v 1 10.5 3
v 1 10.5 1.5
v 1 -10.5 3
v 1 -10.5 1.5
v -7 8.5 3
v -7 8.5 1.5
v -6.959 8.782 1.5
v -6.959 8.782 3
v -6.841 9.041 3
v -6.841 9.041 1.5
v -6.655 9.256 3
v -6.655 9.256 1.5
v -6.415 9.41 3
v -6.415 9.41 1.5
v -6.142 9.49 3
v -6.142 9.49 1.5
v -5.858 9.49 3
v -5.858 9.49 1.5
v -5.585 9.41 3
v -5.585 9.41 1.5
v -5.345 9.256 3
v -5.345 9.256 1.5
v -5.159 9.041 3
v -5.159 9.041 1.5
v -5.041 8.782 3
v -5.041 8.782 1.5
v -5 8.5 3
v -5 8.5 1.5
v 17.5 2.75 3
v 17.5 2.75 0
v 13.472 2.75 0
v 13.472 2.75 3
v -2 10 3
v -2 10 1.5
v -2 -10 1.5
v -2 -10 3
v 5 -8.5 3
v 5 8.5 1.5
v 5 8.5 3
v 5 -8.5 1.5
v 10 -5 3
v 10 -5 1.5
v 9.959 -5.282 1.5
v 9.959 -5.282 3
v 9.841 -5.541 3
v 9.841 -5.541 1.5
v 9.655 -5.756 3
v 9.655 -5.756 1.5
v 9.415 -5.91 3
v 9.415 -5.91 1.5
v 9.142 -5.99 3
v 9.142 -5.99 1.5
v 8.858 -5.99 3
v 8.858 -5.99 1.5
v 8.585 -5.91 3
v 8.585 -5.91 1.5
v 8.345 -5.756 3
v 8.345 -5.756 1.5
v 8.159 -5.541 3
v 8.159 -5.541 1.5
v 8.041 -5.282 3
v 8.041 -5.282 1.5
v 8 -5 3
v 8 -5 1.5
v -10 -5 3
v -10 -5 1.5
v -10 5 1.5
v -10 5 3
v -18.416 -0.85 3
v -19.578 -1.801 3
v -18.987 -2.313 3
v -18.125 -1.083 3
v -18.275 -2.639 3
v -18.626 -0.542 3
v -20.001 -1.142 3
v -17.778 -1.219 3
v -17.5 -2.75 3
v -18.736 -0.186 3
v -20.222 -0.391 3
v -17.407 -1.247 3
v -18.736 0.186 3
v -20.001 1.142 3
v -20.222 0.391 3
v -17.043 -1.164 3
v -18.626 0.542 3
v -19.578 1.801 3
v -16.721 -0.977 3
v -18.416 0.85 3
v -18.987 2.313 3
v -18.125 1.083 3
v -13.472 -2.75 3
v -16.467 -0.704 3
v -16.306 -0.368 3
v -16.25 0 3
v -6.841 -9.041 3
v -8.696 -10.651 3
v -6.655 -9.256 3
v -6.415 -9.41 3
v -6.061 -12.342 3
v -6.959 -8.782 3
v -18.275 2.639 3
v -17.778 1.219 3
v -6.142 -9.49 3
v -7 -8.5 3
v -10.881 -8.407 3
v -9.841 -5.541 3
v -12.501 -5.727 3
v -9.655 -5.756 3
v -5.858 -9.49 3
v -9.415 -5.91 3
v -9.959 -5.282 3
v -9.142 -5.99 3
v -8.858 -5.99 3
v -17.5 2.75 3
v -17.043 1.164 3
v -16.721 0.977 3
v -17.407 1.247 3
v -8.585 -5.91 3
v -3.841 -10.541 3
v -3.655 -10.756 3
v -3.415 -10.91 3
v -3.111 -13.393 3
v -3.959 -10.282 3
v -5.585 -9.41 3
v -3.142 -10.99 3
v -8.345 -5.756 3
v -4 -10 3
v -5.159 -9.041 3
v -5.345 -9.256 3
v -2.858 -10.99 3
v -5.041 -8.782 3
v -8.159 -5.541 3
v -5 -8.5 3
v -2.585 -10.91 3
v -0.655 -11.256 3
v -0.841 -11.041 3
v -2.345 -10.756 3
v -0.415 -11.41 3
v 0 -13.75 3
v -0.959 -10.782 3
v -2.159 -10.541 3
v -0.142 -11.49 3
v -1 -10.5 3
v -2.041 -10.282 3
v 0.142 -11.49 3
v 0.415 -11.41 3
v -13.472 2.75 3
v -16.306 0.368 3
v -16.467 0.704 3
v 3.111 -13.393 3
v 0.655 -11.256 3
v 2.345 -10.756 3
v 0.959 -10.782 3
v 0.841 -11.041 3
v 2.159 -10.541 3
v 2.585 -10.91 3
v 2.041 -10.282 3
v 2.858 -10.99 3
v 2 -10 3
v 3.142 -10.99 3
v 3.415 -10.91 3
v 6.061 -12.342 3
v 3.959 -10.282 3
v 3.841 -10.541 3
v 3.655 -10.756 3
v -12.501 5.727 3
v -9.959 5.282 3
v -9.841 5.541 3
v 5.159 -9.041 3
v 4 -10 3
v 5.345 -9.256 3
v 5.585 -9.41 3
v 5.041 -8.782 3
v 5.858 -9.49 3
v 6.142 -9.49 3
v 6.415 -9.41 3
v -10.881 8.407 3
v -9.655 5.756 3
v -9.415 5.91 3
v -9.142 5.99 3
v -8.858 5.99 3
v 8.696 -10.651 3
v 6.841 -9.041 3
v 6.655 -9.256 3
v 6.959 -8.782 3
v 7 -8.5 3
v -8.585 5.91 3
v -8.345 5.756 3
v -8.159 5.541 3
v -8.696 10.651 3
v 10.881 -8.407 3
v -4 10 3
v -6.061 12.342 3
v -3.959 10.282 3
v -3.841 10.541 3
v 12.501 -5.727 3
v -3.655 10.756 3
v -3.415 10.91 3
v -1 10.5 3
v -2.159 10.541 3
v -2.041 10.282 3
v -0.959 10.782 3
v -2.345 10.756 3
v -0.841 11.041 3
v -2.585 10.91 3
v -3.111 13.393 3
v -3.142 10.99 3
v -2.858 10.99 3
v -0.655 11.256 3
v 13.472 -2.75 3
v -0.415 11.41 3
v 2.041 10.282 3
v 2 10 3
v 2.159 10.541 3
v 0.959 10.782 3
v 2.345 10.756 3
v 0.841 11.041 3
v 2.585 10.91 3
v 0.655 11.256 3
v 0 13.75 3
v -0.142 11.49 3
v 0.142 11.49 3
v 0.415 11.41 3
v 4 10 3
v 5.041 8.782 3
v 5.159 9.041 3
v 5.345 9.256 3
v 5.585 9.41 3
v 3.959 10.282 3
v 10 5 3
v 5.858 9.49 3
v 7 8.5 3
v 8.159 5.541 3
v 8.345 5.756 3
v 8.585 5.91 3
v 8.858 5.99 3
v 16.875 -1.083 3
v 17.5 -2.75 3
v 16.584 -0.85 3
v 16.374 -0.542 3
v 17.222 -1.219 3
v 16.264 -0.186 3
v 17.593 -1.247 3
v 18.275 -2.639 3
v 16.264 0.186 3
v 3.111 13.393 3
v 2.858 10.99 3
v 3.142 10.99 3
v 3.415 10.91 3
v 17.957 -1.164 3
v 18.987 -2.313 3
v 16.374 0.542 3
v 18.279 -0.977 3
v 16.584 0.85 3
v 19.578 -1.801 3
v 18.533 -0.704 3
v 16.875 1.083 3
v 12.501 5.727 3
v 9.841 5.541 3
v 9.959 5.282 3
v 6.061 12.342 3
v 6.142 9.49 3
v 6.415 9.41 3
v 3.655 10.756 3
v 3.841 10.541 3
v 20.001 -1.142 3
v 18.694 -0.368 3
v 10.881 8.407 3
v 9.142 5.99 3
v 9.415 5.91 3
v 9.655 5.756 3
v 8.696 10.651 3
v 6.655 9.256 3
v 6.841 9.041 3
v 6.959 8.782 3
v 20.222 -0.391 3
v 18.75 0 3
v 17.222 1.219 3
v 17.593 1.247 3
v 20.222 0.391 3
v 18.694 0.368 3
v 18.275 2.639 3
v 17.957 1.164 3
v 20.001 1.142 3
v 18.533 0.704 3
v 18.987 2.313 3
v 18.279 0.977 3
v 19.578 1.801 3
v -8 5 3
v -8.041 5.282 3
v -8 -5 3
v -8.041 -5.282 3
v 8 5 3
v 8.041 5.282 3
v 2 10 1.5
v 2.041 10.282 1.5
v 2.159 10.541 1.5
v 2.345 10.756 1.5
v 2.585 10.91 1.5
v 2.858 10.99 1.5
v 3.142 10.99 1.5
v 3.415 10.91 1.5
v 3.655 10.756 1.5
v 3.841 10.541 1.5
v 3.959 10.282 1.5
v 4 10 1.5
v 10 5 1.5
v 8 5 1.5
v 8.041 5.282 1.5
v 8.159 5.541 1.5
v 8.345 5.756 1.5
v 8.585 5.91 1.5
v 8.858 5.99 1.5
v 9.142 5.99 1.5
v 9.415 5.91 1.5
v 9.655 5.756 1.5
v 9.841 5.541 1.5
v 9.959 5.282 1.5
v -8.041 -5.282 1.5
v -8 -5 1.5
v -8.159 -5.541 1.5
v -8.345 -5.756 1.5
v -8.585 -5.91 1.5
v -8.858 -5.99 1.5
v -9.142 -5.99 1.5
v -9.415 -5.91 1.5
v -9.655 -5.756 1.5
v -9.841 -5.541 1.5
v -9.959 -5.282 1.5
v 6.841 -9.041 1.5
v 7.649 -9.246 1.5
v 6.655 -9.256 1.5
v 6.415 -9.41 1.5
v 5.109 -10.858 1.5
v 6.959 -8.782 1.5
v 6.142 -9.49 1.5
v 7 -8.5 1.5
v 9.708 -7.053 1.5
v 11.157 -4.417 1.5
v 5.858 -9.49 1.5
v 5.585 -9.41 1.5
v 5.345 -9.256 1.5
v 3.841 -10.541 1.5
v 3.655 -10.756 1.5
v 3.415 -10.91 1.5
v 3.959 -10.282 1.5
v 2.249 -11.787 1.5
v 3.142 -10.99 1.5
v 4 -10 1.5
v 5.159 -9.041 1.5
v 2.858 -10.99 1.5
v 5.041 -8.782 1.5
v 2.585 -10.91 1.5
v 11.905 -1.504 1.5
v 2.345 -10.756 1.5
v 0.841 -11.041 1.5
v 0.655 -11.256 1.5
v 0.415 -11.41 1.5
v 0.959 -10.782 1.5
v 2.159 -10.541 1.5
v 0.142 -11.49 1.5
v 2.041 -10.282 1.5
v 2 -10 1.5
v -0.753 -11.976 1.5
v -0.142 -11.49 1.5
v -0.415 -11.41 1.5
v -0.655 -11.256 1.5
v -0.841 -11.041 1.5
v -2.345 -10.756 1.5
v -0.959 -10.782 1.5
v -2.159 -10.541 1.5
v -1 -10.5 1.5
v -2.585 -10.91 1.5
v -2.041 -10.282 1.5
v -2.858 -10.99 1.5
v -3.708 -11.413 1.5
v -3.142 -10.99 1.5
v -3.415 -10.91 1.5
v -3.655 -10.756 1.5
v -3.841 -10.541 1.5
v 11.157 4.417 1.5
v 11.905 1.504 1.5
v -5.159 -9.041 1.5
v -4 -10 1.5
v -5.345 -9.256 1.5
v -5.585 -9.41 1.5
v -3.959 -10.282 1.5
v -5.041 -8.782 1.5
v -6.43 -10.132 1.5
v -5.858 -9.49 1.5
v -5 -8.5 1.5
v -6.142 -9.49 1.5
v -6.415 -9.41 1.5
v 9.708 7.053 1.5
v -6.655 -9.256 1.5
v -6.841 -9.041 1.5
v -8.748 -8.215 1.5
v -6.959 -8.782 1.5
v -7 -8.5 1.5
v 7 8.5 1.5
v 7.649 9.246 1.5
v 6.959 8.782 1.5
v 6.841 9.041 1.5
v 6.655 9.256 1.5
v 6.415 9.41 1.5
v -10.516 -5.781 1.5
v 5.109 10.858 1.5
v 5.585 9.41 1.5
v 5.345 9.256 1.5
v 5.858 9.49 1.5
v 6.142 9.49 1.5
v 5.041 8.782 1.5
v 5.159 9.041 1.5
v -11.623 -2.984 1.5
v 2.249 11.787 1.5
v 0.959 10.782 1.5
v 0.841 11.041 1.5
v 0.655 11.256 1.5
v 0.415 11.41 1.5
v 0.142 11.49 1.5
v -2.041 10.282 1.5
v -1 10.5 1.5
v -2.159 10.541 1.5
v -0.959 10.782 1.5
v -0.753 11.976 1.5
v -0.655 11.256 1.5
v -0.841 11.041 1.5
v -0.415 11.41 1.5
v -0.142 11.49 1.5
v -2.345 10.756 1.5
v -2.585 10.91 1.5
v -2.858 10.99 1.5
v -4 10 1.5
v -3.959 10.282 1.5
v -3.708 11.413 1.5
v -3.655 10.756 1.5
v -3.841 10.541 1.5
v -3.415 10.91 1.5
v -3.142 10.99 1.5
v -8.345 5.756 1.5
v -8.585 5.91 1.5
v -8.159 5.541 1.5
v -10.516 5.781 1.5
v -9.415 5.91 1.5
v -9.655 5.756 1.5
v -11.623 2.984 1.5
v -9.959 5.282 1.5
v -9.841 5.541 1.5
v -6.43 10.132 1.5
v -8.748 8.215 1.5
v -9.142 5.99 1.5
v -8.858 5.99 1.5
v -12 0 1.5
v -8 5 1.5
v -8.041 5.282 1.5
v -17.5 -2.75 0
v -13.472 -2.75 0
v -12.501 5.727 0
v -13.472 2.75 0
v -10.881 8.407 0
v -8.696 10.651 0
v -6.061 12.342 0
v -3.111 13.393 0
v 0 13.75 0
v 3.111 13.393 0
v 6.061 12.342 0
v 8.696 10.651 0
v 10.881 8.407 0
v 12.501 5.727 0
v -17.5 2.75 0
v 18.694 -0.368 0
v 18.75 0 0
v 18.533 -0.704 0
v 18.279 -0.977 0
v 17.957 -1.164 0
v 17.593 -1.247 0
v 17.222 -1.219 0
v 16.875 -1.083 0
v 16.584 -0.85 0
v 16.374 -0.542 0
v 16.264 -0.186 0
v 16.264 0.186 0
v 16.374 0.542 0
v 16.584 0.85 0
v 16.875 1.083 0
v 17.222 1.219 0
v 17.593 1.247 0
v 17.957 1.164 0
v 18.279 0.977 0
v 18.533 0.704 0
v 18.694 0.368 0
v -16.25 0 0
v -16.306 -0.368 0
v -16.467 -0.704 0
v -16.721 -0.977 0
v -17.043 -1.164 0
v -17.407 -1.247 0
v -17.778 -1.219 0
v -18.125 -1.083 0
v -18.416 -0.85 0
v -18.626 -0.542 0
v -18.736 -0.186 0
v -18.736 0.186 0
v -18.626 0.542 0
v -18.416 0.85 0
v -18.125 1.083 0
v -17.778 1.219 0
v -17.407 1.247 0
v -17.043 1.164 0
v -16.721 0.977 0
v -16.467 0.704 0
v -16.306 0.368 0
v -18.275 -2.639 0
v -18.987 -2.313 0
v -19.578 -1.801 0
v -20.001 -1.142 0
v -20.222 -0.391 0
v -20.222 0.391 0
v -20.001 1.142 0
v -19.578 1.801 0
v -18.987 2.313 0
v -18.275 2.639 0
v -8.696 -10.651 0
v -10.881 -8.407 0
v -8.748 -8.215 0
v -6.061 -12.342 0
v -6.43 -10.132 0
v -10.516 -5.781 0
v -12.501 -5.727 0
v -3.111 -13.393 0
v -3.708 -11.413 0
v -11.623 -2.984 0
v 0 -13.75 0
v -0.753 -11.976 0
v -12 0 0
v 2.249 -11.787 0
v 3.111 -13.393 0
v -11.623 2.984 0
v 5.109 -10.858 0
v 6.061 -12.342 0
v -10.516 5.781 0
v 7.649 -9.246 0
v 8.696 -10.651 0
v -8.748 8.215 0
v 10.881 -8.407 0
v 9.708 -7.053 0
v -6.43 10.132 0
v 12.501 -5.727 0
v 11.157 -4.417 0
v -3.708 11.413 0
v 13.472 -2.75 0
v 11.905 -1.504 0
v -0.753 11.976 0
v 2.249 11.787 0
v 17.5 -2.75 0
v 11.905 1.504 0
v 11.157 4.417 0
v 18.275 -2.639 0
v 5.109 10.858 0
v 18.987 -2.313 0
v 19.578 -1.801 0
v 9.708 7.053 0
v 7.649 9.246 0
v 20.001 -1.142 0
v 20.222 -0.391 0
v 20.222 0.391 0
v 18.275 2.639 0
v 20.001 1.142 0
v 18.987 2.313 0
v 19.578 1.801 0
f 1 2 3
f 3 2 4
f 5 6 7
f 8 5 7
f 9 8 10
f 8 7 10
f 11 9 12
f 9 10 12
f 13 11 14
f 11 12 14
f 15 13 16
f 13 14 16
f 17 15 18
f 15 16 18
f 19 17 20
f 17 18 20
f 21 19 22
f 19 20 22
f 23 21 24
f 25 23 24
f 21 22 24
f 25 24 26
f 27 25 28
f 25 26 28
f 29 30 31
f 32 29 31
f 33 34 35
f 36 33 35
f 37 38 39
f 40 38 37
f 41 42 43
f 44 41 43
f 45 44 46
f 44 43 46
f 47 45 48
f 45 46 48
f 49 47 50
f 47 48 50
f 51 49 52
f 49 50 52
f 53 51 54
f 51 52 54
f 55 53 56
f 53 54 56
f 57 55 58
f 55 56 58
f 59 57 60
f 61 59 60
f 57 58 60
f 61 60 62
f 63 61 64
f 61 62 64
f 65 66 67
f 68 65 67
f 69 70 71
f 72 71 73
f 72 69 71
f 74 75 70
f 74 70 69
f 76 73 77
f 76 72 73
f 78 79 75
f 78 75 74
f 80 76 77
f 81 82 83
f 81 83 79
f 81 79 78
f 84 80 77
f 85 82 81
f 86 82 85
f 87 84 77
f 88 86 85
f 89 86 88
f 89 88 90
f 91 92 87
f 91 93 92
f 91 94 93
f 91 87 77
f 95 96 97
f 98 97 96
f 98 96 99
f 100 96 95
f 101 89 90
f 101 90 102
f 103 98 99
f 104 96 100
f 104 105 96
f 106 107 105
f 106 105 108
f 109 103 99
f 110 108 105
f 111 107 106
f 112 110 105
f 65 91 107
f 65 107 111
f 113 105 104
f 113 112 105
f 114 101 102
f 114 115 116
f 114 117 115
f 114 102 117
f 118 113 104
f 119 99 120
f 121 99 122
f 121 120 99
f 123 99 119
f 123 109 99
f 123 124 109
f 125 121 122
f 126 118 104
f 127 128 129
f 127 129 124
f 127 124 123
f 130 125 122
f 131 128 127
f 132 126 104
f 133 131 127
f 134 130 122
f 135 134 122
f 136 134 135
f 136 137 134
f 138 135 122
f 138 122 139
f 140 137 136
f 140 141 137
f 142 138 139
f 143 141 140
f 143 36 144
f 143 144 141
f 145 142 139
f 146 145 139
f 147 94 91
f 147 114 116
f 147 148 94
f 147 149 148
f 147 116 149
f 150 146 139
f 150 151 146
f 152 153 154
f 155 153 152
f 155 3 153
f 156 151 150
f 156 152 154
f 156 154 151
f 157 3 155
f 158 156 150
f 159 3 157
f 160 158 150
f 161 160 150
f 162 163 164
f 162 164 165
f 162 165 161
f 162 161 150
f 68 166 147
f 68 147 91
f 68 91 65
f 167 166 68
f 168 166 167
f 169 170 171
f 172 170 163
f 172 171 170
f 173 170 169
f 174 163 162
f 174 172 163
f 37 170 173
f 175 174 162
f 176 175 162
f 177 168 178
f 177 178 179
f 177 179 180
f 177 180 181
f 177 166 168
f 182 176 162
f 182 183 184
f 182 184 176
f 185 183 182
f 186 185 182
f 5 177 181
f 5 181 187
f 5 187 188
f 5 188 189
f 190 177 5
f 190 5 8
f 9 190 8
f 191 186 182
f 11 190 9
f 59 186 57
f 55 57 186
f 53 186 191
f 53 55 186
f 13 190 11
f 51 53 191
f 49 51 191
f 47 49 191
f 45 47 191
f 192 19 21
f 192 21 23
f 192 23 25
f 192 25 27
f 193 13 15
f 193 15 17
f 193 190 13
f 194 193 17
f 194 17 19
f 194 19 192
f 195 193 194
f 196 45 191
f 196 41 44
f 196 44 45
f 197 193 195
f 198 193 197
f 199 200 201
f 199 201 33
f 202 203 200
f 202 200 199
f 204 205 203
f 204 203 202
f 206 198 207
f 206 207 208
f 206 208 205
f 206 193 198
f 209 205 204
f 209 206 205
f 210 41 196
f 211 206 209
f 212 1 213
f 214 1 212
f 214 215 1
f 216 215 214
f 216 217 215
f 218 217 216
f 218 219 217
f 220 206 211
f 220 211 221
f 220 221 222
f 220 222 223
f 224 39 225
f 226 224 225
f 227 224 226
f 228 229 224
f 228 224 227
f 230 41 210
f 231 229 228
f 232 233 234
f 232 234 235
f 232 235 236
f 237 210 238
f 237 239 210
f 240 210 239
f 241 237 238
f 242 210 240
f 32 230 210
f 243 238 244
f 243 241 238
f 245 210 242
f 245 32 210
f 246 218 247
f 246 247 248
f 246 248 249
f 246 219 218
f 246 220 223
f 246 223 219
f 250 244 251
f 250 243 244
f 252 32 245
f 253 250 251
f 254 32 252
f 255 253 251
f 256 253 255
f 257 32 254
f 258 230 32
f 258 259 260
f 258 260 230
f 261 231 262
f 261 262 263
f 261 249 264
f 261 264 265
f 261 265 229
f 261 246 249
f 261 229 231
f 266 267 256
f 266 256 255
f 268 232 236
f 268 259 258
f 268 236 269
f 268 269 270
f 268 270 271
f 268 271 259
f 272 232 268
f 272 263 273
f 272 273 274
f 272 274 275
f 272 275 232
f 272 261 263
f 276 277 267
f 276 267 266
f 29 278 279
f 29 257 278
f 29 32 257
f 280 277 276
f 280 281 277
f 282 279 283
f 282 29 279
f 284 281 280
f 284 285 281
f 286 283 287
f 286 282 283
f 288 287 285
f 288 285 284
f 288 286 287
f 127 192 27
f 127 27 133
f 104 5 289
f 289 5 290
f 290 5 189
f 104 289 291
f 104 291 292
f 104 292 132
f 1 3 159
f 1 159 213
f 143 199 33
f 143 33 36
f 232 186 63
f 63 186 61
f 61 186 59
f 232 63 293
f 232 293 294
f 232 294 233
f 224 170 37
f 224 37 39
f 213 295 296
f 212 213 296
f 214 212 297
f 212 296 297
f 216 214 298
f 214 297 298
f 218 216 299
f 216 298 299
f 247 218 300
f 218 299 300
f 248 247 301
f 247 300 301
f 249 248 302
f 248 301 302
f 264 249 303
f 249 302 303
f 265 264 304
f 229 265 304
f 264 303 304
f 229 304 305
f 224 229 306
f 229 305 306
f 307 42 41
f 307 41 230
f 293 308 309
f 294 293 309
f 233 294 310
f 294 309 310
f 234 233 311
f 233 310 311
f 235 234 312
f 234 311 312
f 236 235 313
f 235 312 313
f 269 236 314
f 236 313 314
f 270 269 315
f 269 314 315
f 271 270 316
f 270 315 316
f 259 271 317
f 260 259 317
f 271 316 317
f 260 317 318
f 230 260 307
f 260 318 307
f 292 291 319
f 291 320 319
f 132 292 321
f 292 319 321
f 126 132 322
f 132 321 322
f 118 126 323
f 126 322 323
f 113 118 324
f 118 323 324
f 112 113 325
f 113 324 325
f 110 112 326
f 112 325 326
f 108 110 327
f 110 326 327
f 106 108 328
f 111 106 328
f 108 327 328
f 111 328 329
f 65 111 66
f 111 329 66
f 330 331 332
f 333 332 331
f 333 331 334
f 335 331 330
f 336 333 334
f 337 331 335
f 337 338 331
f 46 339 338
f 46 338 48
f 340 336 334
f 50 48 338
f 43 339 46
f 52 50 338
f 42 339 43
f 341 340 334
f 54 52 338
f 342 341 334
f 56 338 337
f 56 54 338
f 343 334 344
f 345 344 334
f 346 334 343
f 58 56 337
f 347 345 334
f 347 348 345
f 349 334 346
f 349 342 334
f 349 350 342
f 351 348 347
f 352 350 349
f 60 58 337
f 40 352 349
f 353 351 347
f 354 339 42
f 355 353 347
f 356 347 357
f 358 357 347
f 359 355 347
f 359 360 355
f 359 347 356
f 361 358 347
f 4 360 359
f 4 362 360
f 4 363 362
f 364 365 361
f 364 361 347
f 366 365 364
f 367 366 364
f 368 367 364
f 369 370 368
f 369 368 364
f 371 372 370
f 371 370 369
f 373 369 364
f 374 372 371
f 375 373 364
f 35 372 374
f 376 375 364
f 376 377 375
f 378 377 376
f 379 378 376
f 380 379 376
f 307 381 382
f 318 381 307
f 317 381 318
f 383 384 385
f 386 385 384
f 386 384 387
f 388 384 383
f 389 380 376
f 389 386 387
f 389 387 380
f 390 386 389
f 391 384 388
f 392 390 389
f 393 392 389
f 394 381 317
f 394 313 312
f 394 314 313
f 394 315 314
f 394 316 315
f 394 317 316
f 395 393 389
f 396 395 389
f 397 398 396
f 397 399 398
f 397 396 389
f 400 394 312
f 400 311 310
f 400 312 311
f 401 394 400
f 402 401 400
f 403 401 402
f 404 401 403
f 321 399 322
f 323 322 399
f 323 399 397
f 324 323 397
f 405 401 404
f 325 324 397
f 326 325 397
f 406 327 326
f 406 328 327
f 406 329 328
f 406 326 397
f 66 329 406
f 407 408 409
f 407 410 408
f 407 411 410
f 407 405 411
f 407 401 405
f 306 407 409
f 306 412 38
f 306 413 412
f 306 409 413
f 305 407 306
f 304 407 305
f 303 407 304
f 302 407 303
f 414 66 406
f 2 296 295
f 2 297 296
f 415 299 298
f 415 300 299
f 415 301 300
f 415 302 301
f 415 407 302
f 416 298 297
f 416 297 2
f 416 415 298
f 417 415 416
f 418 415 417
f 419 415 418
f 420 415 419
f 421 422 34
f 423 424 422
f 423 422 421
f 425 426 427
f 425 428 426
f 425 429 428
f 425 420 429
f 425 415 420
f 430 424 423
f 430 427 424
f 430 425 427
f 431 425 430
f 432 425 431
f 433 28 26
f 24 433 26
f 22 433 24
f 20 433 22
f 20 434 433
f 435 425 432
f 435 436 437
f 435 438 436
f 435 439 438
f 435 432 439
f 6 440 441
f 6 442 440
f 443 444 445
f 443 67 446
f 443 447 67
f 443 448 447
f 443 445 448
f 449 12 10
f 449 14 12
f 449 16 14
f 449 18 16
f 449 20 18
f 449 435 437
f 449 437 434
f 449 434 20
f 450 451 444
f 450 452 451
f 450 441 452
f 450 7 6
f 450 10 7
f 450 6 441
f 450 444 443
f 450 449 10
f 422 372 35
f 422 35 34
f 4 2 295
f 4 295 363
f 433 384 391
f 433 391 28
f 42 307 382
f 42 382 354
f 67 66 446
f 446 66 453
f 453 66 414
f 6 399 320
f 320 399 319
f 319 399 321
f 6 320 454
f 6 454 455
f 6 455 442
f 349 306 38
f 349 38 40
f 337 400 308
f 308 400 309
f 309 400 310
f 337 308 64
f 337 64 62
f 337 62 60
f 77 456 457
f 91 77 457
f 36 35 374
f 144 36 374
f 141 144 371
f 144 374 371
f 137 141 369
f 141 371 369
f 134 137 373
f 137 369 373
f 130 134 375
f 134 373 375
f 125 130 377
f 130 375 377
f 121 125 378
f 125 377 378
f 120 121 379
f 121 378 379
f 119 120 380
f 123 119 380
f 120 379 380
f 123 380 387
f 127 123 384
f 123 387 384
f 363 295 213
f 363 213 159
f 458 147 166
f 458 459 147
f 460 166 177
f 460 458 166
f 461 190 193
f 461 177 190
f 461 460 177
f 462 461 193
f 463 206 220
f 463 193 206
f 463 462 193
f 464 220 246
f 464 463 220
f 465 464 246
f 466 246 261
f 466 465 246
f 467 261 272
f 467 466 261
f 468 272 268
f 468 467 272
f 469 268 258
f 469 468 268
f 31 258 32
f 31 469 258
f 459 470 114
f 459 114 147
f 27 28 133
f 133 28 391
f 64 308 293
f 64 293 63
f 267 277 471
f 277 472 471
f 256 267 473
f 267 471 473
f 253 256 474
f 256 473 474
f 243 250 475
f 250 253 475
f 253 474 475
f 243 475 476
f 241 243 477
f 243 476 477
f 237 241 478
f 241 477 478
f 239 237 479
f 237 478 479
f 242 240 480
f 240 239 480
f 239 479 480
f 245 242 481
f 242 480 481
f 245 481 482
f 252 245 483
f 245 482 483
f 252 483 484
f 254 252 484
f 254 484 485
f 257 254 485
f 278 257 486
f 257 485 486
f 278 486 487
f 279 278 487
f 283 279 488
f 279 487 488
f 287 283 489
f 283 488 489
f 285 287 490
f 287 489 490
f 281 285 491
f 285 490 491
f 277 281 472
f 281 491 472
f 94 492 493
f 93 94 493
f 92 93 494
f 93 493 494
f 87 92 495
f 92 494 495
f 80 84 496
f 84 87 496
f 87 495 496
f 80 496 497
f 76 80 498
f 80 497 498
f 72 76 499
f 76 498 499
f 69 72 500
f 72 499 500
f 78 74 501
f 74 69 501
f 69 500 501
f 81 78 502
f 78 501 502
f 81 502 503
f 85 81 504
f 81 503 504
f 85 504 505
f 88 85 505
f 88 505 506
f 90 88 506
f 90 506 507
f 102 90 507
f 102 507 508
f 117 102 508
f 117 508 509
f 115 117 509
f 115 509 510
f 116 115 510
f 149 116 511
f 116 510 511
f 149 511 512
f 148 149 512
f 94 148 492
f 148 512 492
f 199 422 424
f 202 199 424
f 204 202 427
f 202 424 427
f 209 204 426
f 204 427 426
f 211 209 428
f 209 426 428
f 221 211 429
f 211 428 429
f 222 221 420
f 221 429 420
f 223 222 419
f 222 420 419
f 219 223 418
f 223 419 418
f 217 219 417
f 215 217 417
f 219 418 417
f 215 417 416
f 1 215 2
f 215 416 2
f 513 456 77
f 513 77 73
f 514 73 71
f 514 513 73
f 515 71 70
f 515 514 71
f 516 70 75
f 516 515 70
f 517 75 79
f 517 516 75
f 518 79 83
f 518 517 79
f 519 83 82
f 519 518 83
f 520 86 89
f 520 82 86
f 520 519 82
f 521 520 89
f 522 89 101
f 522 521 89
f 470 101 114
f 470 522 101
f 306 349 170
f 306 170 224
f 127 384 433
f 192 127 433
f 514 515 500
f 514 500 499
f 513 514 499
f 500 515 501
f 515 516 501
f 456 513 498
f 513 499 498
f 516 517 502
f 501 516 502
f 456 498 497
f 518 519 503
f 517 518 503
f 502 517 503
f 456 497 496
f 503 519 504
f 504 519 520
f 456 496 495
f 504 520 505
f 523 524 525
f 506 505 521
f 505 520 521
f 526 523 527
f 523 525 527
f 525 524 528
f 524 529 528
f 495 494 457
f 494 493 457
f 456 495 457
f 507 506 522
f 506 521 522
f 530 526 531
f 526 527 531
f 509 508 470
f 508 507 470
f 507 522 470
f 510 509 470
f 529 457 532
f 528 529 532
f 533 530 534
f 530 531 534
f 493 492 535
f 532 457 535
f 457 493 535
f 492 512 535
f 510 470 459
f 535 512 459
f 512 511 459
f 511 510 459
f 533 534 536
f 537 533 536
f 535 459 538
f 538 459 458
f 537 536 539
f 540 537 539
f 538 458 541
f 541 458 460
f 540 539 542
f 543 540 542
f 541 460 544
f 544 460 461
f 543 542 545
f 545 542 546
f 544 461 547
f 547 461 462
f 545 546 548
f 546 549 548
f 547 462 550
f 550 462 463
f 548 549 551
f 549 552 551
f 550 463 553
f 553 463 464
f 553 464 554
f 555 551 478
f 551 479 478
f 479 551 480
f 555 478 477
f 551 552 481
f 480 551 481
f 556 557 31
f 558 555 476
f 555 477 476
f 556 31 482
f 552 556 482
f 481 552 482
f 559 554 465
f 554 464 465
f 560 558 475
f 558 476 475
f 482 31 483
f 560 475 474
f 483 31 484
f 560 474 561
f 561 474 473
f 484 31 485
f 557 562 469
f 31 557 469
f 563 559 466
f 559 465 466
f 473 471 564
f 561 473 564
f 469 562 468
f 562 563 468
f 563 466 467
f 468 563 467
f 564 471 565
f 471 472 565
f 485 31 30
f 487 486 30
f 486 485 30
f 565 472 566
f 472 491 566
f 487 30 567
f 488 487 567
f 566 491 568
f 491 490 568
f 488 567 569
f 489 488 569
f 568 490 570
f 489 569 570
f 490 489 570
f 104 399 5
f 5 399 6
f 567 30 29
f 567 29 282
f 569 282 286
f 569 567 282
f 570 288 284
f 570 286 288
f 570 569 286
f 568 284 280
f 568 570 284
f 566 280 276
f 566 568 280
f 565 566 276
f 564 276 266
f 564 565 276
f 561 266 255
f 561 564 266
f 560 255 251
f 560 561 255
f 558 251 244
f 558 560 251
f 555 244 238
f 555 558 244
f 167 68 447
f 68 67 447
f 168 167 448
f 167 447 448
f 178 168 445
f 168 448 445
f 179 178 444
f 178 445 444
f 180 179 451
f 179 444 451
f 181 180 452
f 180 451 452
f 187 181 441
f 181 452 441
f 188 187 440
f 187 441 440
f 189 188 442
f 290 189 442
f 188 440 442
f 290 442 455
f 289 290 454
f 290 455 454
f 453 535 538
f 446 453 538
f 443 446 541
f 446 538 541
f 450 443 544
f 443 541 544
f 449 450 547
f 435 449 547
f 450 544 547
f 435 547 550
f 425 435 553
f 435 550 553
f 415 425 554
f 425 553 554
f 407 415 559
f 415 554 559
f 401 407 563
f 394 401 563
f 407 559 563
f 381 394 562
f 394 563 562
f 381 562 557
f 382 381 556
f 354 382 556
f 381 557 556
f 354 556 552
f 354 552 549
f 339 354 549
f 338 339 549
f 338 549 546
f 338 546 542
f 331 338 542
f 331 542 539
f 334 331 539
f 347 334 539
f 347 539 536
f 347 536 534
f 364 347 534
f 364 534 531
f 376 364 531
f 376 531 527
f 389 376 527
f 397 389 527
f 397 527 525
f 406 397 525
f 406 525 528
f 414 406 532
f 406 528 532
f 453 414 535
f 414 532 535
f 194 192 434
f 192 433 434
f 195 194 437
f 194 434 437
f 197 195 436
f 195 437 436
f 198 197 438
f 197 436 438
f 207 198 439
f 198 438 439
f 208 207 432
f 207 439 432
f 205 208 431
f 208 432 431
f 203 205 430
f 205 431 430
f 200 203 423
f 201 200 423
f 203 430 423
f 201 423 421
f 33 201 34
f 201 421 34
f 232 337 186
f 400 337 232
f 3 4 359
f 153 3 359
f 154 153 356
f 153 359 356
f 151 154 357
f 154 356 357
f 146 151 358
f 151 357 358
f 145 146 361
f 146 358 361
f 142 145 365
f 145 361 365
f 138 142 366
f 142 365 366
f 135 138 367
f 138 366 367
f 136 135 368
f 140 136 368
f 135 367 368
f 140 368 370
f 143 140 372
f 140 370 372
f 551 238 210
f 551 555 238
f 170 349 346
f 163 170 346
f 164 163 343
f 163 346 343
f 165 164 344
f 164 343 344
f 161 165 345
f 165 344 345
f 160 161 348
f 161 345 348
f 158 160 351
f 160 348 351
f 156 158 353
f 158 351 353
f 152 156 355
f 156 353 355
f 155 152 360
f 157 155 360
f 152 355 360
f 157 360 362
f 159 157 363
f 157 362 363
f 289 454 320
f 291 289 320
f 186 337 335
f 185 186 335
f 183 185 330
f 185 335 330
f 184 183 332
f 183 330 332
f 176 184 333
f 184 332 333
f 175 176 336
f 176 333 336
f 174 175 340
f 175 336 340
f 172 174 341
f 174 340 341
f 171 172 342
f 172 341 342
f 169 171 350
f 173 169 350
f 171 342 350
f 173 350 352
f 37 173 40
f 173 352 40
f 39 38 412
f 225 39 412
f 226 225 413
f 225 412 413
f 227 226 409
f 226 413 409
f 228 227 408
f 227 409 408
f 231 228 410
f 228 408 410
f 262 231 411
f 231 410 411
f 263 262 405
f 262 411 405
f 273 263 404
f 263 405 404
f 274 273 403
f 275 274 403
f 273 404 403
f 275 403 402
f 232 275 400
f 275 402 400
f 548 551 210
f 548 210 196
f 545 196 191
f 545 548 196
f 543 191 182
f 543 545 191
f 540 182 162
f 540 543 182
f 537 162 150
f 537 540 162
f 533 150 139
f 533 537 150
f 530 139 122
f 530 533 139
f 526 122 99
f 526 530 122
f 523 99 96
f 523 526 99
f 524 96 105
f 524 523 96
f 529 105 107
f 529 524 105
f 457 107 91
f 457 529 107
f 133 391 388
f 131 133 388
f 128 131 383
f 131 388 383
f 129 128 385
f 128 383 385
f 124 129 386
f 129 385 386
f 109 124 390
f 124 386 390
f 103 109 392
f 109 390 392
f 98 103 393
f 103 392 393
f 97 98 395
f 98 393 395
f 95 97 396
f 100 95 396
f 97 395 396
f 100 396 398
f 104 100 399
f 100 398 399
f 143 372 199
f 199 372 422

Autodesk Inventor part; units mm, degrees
ref_plane "YZ Plane" through (0, 0, 0) normal (1, 0, 0) x (0, 1, 0)
ref_plane "XZ Plane" through (0, 0, 0) normal (0, 1, 0) x (-1, 0, 0)
ref_plane "XY Plane" through (0, 0, 0) normal (0, 0, 1) x (1, 0, 0)
sketch "스케치1" plane through (0, 0, 0) normal (0, 0, 1) x (1, 0, 0)
  circle A0 centre (0, 0) radius 13.75
  circle A1 centre (17.5, 0) radius 1.25
  circle A2 centre (17.5, 0) radius 2.75
  line L0 (17.5, 2.75) -> (13.4722, 2.75)
  line L1 (17.5, -2.75) -> (13.4722, -2.75)
  line L2 (0, 0) -> (0, 3.2191)
  circle A3 centre (-17.5, 0) radius 1.25
  circle A4 centre (-17.5, 0) radius 2.75
  line L3 (-17.5, 2.75) -> (-13.4722, 2.75)
  line L4 (-17.5, -2.75) -> (-13.4722, -2.75)
  dimension "d0" = 27.5
  dimension "d1" = 2.5
  dimension "d2" = 5.5
  dimension "d22" = 35
extrude "돌출1" add sketch "스케치1" along normal blind 3
sketch "스케치2" plane through (0, 0, 0) normal (0, 0, -1) x (-1, 0, 0)
  circle A0 centre (0, 0) radius 12
  dimension "d5" = 24
extrude "돌출2" cut sketch "스케치2" against normal blind 1.5
sketch "스케치3" plane through (0, 0, 1.5) normal (0, 0, -1) x (-1, 0, 0)
  line L0 (0, 10.5) -> (0, -10.5) construction
  line L1 (-1, 10.5) -> (-1, -10.5)
  line L2 (1, -10.5) -> (1, 10.5)
  arc A0 (1, 10.5) -> (-1, 10.5) centre (0, 10.5) ccw
  arc A1 (-1, -10.5) -> (1, -10.5) centre (0, -10.5) ccw
  line L3 (3, -10) -> (3, 10) construction
  line L4 (4, -10) -> (4, 10)
  line L5 (2, 10) -> (2, -10)
  arc A2 (2, -10) -> (4, -10) centre (3, -10) ccw
  arc A3 (4, 10) -> (2, 10) centre (3, 10) ccw
  line L6 (6, -8.5) -> (6, 8.5) construction
  line L7 (7, -8.5) -> (7, 8.5)
  line L8 (5, 8.5) -> (5, -8.5)
  arc A4 (5, -8.5) -> (7, -8.5) centre (6, -8.5) ccw
  arc A5 (7, 8.5) -> (5, 8.5) centre (6, 8.5) ccw
  line L9 (9, -5) -> (9, 5) construction
  line L10 (10, -5) -> (10, 5)
  line L11 (8, 5) -> (8, -5)
  arc A6 (8, -5) -> (10, -5) centre (9, -5) ccw
  arc A7 (10, 5) -> (8, 5) centre (9, 5) ccw
  line L12 (-3, -10) -> (-3, 10) construction
  line L13 (-4, -10) -> (-4, 10)
  line L14 (-2, 10) -> (-2, -10)
  arc A8 (-4, -10) -> (-2, -10) centre (-3, -10) ccw
  arc A9 (-2, 10) -> (-4, 10) centre (-3, 10) ccw
  line L15 (-6, -8.5) -> (-6, 8.5) construction
  line L16 (-7, -8.5) -> (-7, 8.5)
  line L17 (-5, 8.5) -> (-5, -8.5)
  arc A10 (-7, -8.5) -> (-5, -8.5) centre (-6, -8.5) ccw
  arc A11 (-5, 8.5) -> (-7, 8.5) centre (-6, 8.5) ccw
  line L18 (-9, -5) -> (-9, 5) construction
  line L19 (-10, -5) -> (-10, 5)
  line L20 (-8, 5) -> (-8, -5)
  arc A12 (-10, -5) -> (-8, -5) centre (-9, -5) ccw
  arc A13 (-8, 5) -> (-10, 5) centre (-9, 5) ccw
  point P0 (0, 0)
  point P1 (3, 0)
  point P2 (6, 0)
  point P3 (9, 0)
  point P4 (-3, 0)
  point P5 (-6, 0)
  point P6 (-9, 0)
  dimension "d8" = 21
  dimension "d9" = 1
  dimension "d10" = 1
  dimension "d11" = 1
  dimension "d12" = 20
  dimension "d13" = 17
  dimension "d14" = 1
  dimension "d15" = 1
  dimension "d17" = 1
  dimension "d18" = 10
  dimension "d19" = 1
extrude "돌출3" cut sketch "스케치3" against normal blind 1.5
properties part number "스피커 홀더"
